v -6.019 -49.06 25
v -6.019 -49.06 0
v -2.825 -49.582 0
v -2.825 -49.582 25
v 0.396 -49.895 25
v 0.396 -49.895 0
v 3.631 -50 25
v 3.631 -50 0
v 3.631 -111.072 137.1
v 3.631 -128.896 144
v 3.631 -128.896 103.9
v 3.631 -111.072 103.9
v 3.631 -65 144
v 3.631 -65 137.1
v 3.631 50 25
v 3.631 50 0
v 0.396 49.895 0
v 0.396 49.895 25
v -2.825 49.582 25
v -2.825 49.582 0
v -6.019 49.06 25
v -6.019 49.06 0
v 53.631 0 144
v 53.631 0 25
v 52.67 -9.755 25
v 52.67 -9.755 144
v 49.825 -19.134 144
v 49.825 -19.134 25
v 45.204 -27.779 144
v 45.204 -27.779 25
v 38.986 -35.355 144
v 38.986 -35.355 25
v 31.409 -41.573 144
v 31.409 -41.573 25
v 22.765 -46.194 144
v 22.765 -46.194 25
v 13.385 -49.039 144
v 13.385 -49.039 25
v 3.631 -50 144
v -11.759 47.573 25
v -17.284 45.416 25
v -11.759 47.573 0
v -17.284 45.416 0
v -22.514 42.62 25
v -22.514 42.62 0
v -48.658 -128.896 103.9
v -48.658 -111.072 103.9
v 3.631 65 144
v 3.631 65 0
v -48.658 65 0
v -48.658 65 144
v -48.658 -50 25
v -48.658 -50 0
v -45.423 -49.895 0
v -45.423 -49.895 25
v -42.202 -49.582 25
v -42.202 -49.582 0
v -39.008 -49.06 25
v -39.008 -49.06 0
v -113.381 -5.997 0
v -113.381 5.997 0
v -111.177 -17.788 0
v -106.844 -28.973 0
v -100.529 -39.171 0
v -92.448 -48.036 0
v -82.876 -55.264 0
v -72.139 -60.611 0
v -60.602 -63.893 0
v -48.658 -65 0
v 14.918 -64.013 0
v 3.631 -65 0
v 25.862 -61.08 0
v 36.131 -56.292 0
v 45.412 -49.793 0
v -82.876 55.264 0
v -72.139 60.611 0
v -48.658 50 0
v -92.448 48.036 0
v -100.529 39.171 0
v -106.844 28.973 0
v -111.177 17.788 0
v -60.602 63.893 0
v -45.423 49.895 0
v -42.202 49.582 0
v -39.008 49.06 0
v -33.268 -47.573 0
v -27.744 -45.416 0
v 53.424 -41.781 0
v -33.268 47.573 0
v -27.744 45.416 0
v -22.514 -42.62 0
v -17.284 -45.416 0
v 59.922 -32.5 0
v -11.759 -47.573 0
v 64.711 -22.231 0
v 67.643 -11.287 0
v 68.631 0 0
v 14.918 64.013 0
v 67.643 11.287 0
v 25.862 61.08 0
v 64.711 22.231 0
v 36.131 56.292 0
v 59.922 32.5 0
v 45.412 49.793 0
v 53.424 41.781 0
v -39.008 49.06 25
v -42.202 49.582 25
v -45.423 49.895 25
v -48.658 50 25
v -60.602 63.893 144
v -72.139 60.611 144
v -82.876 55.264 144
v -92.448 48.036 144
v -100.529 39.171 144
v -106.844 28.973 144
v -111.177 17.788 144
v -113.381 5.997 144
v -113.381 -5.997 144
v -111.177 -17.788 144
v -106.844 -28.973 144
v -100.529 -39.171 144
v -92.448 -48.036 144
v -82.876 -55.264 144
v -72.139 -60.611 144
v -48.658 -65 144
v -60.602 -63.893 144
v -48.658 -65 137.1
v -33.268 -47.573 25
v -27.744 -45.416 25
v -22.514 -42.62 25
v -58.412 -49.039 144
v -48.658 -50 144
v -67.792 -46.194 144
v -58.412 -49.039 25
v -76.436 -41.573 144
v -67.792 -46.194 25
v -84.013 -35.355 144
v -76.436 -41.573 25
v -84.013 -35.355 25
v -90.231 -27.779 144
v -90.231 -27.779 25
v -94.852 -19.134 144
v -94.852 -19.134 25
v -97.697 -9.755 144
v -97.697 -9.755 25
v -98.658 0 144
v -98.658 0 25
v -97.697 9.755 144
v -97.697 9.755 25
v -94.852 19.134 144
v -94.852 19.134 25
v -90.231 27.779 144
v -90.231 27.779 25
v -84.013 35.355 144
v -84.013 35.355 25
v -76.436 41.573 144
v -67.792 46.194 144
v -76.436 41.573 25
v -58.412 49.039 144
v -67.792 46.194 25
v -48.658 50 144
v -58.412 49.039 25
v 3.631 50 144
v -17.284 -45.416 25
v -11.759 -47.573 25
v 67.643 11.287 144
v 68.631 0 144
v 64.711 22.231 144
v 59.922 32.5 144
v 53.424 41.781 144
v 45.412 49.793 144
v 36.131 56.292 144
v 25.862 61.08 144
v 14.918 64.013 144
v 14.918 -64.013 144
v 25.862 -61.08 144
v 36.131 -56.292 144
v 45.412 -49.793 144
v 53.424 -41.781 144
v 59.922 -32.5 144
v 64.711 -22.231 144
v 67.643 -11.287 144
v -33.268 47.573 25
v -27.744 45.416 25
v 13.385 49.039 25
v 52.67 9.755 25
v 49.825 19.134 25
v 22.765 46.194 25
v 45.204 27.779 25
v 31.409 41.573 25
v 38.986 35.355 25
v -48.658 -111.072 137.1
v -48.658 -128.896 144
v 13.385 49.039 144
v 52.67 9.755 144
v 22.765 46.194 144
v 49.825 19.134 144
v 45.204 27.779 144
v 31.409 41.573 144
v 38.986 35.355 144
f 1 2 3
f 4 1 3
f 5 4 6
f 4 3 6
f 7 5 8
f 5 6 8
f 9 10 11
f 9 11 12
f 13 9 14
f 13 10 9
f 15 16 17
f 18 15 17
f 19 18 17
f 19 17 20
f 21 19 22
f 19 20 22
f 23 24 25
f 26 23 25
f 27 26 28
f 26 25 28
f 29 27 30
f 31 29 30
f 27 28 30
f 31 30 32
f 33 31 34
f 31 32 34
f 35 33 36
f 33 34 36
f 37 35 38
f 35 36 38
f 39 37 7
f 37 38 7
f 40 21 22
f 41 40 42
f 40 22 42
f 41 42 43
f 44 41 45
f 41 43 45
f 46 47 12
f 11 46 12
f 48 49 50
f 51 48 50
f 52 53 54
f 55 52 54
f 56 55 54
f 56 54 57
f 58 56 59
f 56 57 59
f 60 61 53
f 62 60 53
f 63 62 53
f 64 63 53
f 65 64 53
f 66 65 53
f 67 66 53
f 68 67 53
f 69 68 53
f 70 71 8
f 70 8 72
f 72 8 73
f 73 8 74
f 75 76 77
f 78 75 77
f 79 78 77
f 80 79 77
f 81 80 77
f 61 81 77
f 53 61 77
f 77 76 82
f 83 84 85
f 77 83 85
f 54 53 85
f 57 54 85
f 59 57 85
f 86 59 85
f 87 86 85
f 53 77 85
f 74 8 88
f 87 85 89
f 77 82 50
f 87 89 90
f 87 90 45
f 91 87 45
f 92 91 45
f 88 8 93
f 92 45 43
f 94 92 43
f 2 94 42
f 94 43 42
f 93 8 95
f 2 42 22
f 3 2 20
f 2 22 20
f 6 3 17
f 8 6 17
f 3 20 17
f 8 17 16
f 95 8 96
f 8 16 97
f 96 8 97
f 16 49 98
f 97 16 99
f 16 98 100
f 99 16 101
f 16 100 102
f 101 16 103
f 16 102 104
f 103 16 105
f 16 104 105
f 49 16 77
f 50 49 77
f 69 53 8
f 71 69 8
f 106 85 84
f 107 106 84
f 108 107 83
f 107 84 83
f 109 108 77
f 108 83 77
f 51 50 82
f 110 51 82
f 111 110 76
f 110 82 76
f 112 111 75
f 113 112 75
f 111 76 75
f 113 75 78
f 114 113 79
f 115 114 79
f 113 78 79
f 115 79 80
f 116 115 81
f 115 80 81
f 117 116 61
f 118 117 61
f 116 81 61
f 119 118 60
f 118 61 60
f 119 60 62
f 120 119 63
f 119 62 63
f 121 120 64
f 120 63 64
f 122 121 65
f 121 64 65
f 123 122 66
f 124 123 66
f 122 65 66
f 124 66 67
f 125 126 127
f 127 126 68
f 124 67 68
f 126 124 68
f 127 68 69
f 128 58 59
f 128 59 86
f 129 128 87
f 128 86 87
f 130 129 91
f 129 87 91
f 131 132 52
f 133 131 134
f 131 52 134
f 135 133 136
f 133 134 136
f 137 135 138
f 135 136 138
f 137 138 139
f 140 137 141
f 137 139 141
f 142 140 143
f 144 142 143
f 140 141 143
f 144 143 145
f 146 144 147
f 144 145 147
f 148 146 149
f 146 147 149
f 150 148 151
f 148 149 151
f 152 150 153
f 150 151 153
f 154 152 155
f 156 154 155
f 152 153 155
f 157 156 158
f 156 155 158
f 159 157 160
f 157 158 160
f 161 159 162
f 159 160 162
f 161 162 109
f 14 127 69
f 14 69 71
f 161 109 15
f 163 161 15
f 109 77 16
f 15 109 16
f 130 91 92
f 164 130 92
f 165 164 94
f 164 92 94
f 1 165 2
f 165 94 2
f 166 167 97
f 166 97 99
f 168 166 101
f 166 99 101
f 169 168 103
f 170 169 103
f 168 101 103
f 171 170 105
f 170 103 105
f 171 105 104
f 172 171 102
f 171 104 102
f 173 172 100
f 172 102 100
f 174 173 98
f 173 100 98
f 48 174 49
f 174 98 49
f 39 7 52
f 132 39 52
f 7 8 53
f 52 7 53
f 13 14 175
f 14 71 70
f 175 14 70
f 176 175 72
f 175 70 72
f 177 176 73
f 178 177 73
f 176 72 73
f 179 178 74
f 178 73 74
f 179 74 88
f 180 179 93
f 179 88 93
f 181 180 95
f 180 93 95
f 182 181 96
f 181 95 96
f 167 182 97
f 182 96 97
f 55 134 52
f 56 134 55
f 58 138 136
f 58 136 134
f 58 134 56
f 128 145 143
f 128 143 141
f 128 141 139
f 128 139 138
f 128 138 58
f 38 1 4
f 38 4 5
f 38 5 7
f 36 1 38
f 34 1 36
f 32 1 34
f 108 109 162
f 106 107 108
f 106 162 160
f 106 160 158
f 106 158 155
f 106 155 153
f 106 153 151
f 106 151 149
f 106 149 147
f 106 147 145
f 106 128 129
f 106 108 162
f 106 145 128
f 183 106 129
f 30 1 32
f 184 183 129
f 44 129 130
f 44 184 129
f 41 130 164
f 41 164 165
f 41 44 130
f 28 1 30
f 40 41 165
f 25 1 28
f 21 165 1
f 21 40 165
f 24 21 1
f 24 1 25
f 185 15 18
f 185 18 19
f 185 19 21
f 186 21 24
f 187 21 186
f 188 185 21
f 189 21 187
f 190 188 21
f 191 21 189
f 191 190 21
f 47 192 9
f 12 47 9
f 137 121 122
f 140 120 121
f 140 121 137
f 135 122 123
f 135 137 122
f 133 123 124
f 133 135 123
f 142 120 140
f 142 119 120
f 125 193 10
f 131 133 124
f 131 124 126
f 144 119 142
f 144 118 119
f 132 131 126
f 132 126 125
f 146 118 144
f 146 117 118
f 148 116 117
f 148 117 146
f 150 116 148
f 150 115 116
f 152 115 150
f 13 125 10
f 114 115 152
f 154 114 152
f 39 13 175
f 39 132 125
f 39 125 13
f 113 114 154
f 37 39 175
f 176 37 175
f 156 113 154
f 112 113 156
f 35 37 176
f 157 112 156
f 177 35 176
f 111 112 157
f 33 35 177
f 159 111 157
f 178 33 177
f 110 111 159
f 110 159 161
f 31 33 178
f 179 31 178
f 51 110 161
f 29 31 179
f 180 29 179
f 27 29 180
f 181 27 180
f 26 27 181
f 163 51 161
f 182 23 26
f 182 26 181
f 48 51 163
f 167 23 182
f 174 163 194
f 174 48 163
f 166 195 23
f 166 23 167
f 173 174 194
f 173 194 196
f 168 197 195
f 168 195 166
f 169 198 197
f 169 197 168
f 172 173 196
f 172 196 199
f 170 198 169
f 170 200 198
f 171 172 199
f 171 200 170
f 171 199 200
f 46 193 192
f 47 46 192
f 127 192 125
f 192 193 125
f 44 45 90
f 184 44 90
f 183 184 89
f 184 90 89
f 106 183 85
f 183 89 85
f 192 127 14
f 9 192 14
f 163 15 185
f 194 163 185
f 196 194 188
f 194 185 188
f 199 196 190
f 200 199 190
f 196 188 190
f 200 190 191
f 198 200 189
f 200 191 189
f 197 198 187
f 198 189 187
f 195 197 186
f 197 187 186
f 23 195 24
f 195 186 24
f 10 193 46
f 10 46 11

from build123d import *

# Parameters (mm, degrees)
F1_DEPTH = 144
F2_W     = 52.2887532134
F2_H     = 46.0724334717
F3_DEPTH = 6.9
F2_H_2   = 17.8235247731
F4_DEPTH = 40.1
F5_DEPTH = 25


with BuildPart() as f1:
    # F0 (on Top) → F1 (new body)
    with BuildSketch(Plane.XY):
        with BuildLine():
            ThreePointArc((-22.5135510555, -59.5102644243), (-35.3006672315, -63.6127628215), (-48.6579276621, -65))
            Line((-48.6579276621, -65), (3.6308255512, -65))
            ThreePointArc((3.6308255512, -65), (-9.7264348794, -63.6127628215), (-22.5135510555, -59.5102644243))
        make_face()
        with BuildLine():
            ThreePointArc((-22.5135510555, 59.5102644243), (-35.3006672315, 63.6127628215), (-48.6579276621, 65))
            ThreePointArc((-48.6579276621, 65), (-113.6579276621, 0), (-48.6579276621, -65))
            ThreePointArc((-48.6579276621, -65), (-35.3006672315, -63.6127628215), (-22.5135510555, -59.5102644243))
            ThreePointArc((-22.5135510555, -59.5102644243), (-30.5403925409, -55.2931085589), (-37.9022937634, -50))
            Line((-37.9022937634, -50), (-48.6579276621, -50))
            ThreePointArc((-48.6579276621, -50), (-98.6579276621, 0), (-48.6579276621, 50))
            Line((-48.6579276621, 50), (-37.9022937634, 50))
            ThreePointArc((-37.9022937634, 50), (-30.5403925409, 55.2931085589), (-22.5135510555, 59.5102644243))
        make_face()
        with BuildLine():
            Line((3.6308255512, 65), (-48.6579276621, 65))
            ThreePointArc((-48.6579276621, 65), (-35.3006672315, 63.6127628215), (-22.5135510555, 59.5102644243))
            ThreePointArc((-22.5135510555, 59.5102644243), (-9.7264348794, 63.6127628215), (3.6308255512, 65))
        make_face()
        with BuildLine():
            ThreePointArc((3.6308255512, 65), (-9.7264348794, 63.6127628215), (-22.5135510555, 59.5102644243))
            ThreePointArc((-22.5135510555, 59.5102644243), (-14.48670957, 55.2931085589), (-7.1248083475, 50))
            Line((-7.1248083475, 50), (3.6308255512, 50))
            ThreePointArc((3.6308255512, 50), (38.9861646106, 35.3553390593), (53.6308255512, 0))
            ThreePointArc((53.6308255512, 0), (38.9861646106, -35.3553390593), (3.6308255512, -50))
            Line((3.6308255512, -50), (-7.1248083475, -50))
            ThreePointArc((-7.1248083475, -50), (-14.48670957, -55.2931085589), (-22.5135510555, -59.5102644243))
            ThreePointArc((-22.5135510555, -59.5102644243), (-9.7264348794, -63.6127628215), (3.6308255512, -65))
            ThreePointArc((3.6308255512, -65), (49.5927663284, -45.9619407771), (68.6308255512, 0))
            ThreePointArc((68.6308255512, 0), (49.5927663284, 45.9619407771), (3.6308255512, 65))
        make_face()
        with BuildLine():
            ThreePointArc((-7.1248083475, 50), (-14.48670957, 55.2931085589), (-22.5135510555, 59.5102644243))
            ThreePointArc((-22.5135510555, 59.5102644243), (-30.5403925409, 55.2931085589), (-37.9022937634, 50))
            Line((-37.9022937634, 50), (-7.1248083475, 50))
        make_face()
        with BuildLine():
            ThreePointArc((-37.9022937634, -50), (-30.5403925409, -55.2931085589), (-22.5135510555, -59.5102644243))
            ThreePointArc((-22.5135510555, -59.5102644243), (-14.48670957, -55.2931085589), (-7.1248083475, -50))
            Line((-7.1248083475, -50), (-37.9022937634, -50))
        make_face()
    extrude(amount=F1_DEPTH)

    # F2 (on face) → F3 (join)
    with BuildSketch(Plane.XY.offset(144)):
        with Locations((-22.5135510555, -88.0362167358)):
            Rectangle(F2_W, F2_H)
    extrude(amount=-F3_DEPTH)

    # F2 (on face) → F4 (join)
    with BuildSketch(Plane.XY.offset(144)):
        with Locations((-22.5135510555, -119.9841958582)):
            Rectangle(F2_W, F2_H_2)
    extrude(amount=-F4_DEPTH)

    # F0 (on Top) → F5 (join)
    with BuildSketch(Plane.XY):
        with BuildLine():
            ThreePointArc((-39.0084939829, -49.060049222), (-61.3691744488, 0), (-39.0084939829, 49.060049222))
            ThreePointArc((-39.0084939829, 49.060049222), (-43.810374728, 49.7644575028), (-48.6579276621, 50))
            ThreePointArc((-48.6579276621, 50), (-98.6579276621, 0), (-48.6579276621, -50))
            ThreePointArc((-48.6579276621, -50), (-43.810374728, -49.7644575028), (-39.0084939829, -49.060049222))
        make_face()
        with BuildLine():
            ThreePointArc((-22.5135510555, 42.620084137), (-30.473662451, 46.5760936396), (-39.0084939829, 49.060049222))
            ThreePointArc((-39.0084939829, 49.060049222), (-61.3691744488, 0), (-39.0084939829, -49.060049222))
            ThreePointArc((-39.0084939829, -49.060049222), (-30.473662451, -46.5760936396), (-22.5135510555, -42.620084137))
            ThreePointArc((-22.5135510555, -42.620084137), (-46.3691744488, 0), (-22.5135510555, 42.620084137))
        make_face()
        with BuildLine():
            ThreePointArc((1.3420723379, 0), (-5.0275550398, 24.4211094104), (-22.5135510555, 42.620084137))
            ThreePointArc((-22.5135510555, 42.620084137), (-46.3691744488, 0), (-22.5135510555, -42.620084137))
            ThreePointArc((-22.5135510555, -42.620084137), (-5.0275550398, -24.4211094104), (1.3420723379, 0))
        make_face()
        with BuildLine():
            ThreePointArc((16.3420723379, 0), (10.4883138487, 26.9577839435), (-6.018608128, 49.060049222))
            ThreePointArc((-6.018608128, 49.060049222), (-14.55343966, 46.5760936396), (-22.5135510555, 42.620084137))
            ThreePointArc((-22.5135510555, 42.620084137), (-5.0275550398, 24.4211094104), (1.3420723379, 0))
            ThreePointArc((1.3420723379, 0), (-5.0275550398, -24.4211094104), (-22.5135510555, -42.620084137))
            ThreePointArc((-22.5135510555, -42.620084137), (-14.55343966, -46.5760936396), (-6.018608128, -49.060049222))
            ThreePointArc((-6.018608128, -49.060049222), (10.4883138487, -26.9577839435), (16.3420723379, 0))
        make_face()
        with BuildLine():
            ThreePointArc((3.6308255512, 50), (-1.2167273829, 49.7644575028), (-6.018608128, 49.060049222))
            ThreePointArc((-6.018608128, 49.060049222), (10.4883138487, 26.9577839435), (16.3420723379, 0))
            ThreePointArc((16.3420723379, 0), (10.4883138487, -26.9577839435), (-6.018608128, -49.060049222))
            ThreePointArc((-6.018608128, -49.060049222), (-1.2167273829, -49.7644575028), (3.6308255512, -50))
            ThreePointArc((3.6308255512, -50), (38.9861646106, -35.3553390593), (53.6308255512, 0))
            ThreePointArc((53.6308255512, 0), (38.9861646106, 35.3553390593), (3.6308255512, 50))
        make_face()
    extrude(amount=F5_DEPTH)


solid = f1.part
